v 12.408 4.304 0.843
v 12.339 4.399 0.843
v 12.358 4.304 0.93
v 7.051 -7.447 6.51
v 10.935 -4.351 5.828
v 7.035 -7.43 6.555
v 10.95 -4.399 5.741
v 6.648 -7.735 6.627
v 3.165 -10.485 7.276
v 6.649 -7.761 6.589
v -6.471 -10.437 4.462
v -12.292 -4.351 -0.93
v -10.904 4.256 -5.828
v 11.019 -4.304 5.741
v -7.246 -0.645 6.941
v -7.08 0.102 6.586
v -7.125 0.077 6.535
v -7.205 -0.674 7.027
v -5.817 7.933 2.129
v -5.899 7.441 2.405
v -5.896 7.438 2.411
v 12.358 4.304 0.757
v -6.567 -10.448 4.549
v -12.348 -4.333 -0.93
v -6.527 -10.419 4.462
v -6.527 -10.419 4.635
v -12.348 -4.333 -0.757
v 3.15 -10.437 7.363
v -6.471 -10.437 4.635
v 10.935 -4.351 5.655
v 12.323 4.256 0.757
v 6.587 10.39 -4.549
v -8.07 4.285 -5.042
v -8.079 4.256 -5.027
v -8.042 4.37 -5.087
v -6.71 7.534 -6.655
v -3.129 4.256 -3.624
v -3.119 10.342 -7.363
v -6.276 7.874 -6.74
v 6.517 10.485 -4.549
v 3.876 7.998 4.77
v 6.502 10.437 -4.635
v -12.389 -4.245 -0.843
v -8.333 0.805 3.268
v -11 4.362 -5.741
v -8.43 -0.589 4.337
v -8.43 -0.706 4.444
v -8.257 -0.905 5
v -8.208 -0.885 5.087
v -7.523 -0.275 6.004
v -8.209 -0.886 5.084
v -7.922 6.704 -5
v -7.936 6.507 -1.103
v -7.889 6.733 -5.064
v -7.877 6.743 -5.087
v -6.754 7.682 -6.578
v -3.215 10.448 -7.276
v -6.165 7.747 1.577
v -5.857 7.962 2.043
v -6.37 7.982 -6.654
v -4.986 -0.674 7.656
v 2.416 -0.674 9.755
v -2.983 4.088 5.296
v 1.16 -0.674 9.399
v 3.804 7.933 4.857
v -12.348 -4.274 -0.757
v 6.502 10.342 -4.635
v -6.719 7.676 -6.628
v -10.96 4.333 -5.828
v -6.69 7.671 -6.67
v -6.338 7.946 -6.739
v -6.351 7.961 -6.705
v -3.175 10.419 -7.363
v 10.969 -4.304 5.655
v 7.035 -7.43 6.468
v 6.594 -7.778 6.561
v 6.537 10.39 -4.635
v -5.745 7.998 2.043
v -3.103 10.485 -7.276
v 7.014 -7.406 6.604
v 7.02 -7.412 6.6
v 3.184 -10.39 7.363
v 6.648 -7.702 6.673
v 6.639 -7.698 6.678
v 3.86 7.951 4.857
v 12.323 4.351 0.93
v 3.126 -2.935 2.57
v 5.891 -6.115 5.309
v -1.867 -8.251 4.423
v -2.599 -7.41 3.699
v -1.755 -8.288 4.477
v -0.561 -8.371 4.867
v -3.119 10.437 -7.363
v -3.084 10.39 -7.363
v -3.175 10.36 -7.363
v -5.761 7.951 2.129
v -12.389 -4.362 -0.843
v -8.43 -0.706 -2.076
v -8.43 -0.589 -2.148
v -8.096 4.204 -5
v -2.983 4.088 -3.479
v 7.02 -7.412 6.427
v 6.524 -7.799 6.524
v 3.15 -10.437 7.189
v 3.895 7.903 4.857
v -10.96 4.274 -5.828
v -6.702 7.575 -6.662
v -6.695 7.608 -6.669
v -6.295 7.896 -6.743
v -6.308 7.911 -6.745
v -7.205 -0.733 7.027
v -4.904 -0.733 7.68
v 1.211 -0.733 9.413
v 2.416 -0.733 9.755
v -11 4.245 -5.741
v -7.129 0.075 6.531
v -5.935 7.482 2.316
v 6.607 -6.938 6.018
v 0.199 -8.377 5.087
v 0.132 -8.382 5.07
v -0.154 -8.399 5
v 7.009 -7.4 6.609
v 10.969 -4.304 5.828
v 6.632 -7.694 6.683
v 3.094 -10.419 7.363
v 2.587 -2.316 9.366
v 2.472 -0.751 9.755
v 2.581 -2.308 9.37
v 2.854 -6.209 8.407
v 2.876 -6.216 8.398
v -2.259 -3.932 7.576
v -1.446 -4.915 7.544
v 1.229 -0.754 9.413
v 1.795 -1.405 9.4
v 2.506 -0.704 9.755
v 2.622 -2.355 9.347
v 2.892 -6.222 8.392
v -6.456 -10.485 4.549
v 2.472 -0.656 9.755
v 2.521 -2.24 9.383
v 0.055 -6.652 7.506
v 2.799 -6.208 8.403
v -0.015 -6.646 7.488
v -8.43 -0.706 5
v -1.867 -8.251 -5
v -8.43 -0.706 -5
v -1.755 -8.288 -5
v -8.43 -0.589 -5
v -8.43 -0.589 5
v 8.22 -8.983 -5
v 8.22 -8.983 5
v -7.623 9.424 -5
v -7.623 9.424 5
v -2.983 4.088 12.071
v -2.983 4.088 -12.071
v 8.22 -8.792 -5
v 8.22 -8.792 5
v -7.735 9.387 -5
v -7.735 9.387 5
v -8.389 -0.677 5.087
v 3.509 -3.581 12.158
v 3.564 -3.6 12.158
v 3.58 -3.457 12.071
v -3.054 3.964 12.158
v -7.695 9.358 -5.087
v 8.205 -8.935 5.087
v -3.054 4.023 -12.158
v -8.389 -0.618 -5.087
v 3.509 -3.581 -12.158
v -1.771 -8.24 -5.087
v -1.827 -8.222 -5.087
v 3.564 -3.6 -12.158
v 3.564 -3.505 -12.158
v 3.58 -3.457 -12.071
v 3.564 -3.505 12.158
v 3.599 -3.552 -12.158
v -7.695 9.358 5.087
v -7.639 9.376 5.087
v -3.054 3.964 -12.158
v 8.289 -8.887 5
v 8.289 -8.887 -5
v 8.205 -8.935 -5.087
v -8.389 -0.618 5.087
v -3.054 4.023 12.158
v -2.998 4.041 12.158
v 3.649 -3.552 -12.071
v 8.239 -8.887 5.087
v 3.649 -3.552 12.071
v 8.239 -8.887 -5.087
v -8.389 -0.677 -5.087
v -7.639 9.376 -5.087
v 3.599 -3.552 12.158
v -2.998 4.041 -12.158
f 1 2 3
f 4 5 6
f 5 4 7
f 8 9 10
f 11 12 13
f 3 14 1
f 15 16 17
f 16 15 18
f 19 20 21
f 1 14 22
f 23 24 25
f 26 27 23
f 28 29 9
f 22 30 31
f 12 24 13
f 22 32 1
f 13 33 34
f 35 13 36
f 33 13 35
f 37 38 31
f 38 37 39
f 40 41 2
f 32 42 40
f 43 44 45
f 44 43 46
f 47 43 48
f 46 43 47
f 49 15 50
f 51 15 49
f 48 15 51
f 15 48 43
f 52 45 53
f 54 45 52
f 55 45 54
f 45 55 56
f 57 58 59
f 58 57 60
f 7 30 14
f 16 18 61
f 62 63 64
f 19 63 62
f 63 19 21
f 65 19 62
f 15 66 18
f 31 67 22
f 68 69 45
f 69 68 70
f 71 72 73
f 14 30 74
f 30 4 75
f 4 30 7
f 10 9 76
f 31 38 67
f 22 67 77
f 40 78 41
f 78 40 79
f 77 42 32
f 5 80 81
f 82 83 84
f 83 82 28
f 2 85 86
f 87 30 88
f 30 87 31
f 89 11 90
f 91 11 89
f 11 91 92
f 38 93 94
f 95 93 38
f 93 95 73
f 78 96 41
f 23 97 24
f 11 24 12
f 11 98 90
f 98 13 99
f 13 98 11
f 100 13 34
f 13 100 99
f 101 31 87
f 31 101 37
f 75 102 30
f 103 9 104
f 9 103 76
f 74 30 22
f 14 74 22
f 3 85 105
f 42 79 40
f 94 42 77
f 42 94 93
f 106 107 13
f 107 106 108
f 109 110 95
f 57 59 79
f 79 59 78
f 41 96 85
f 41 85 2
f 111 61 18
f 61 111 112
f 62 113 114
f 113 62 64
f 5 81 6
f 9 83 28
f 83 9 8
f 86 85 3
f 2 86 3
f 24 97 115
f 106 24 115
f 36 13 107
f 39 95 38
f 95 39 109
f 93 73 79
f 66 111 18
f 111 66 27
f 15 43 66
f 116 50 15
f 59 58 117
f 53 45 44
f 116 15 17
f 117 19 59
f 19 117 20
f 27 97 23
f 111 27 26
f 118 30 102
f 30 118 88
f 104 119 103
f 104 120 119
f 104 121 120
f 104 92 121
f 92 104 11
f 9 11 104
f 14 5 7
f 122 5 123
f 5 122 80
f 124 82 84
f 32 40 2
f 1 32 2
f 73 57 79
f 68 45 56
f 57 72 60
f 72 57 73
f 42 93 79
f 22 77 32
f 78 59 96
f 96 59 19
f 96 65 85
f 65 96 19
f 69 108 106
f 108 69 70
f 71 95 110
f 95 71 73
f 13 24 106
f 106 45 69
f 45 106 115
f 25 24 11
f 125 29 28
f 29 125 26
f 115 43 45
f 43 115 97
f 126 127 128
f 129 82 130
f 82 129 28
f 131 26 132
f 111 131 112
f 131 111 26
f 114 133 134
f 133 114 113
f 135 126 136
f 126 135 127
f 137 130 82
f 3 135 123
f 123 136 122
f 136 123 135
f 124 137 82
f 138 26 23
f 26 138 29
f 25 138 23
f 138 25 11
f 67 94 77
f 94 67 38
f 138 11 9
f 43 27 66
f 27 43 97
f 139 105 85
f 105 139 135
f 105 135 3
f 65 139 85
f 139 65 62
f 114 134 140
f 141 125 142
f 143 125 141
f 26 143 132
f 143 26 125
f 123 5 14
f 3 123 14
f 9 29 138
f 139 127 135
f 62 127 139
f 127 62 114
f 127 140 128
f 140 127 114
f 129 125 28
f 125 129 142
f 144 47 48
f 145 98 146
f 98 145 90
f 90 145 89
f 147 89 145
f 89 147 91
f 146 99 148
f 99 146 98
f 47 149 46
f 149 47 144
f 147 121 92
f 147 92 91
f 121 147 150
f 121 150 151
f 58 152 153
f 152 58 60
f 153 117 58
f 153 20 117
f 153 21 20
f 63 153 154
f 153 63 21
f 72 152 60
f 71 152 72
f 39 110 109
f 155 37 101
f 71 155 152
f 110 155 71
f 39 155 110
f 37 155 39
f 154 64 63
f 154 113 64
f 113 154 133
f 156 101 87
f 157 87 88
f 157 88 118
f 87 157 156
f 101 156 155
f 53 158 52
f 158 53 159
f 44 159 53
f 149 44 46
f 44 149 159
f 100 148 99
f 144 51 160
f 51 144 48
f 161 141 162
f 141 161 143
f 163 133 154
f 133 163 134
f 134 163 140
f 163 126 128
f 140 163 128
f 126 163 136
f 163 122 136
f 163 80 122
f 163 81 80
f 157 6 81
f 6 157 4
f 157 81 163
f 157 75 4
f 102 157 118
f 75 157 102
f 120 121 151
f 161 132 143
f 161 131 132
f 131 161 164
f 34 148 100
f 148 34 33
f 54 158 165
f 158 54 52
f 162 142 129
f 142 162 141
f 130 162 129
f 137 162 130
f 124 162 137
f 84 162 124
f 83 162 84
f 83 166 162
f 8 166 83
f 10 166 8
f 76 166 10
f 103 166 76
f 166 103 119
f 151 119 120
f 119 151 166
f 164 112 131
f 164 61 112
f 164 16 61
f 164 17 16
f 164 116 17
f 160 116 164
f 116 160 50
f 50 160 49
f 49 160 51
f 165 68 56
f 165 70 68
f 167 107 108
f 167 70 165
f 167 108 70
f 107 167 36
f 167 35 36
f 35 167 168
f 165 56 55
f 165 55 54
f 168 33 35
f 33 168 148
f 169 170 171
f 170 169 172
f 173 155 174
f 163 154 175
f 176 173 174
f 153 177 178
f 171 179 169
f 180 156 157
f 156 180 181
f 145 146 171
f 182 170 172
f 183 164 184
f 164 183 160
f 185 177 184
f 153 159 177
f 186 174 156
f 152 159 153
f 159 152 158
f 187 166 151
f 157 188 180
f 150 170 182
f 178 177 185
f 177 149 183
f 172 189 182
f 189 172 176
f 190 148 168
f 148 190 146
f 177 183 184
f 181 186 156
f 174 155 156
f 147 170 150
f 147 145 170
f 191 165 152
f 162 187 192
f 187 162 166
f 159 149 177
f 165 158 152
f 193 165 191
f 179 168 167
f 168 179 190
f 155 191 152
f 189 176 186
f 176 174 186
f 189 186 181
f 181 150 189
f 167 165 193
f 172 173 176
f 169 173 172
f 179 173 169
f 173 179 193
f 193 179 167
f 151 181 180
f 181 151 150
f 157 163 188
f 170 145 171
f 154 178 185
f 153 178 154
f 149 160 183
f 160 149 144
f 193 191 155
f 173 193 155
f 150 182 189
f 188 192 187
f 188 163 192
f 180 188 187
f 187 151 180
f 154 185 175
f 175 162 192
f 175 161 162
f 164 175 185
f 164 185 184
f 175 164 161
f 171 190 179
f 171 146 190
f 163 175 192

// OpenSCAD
// Auto-generated OpenSCAD file

    inner_points = 10*[[0.3549004973467511, -0.35521054808402747, -1.2071067811864837], [-0.30136407955047917, 0.39932030291538634, -1.2071067811866112], [0.3549004973463955, -0.3552105480839295, 1.2071067811866112], [-0.3013640795508348, 0.3993203029154843, 1.2071067811864837], [0.818949629923199, -0.8887444294401406, -0.4999999999998463], [-0.7654132121271353, 0.9328541842715569, -0.5000000000001537], [0.8189496299230516, -0.8887444294401, 0.5000000000001537], [-0.7654132121272826, 0.9328541842715975, 0.4999999999998463], [-0.178633384009495, -0.8192596806605508, -0.4999999999999961], [-0.8348979609067254, -0.06472882966113712, -0.5000000000001235], [-0.17863338400964232, -0.8192596806605101, 0.5000000000000039], [-0.8348979609068726, -0.06472882966109651, 0.49999999999987654]];

    outer_points = 10*[[1.2307668032340542, 0.4303553059775063, 0.08434552661867156], [1.0919099787017486, -0.4303553059775063, 0.574137344382946], [-1.0919099787017486, 0.4303553059775063, -0.574137344382946], [-1.2307668032340542, -0.4303553059775063, -0.08434552661867156], [0.6486571265504295, 1.0389696163301188, -0.4548547567133196], [0.3134270975364759, -1.0389696163301188, 0.7276072924725627], [-0.3134270975364759, 1.0389696163301188, -0.7276072924725627], [-0.6486571265504295, -1.0389696163301188, 0.4548547567133196], [0.3844694278615675, 0.7903395017889528, 0.47701858554126475], [0.24561260332926171, -0.07037111016605979, 0.9668104033055391], [-0.577614796225338, 0.7903395017889528, 0.20426604978202156], [-0.7164716207576437, -0.07037111016605979, 0.6940578675462961]];

    // Convex hull for inner set (I)
    module inner_hull() {
        hull() {
            for (p = inner_points) {
                translate(p) sphere(r=0.1);
            }
        }
    }

    // Convex hull for outer set (O) minus inner hull (O \ I)
    module outer_minus_inner() {
        difference() {
            hull() {
                for (p = outer_points) {
                    translate(p) sphere(r=0.1);
                }
            }
            inner_hull(); // Subtract inner hull
        }
    }

    // Convex hull for outer set (O) minus all translated inner hulls
    module outer_minus_AllTranslationInner() {
        difference() {
            hull() {
                for (p = outer_points) {
                    translate(p) sphere(r=0.1);
                }
            }
            hull() {
                translate([0,0,50]) inner_hull();
                translate([0,0,-50]) inner_hull();
            }; // Subtract translated inner hulls
        }
    }

    // Difference between outer_minus_inner and outer_minus_AllTranslationInner
    module outer_minus_inner_diff() {
        difference() {
            // Outer minus inner
            difference() {
                hull() {
                    for (p = outer_points) {
                        translate(p) sphere(r=0.1);
                    }
                }
                inner_hull();
            }

            // Subtract Outer minus AllTranslationInner
            difference() {
                hull() {
                    for (p = outer_points) {
                        translate(p) sphere(r=0.1);
                    }
                }
                hull() {
                    translate([0,0,50]) inner_hull();
                    translate([0,0,-50]) inner_hull();
                };
            }
        }
    }

    // Rendering all with colors applied
    color([1, 0, 0, 0.5]) inner_hull(); // Transparent red
    color([0, 1, 0, 1]) outer_minus_AllTranslationInner(); // Opaque green
    color([1, 1, 0, 1]) outer_minus_inner_diff(); // Opaque yellow
    
